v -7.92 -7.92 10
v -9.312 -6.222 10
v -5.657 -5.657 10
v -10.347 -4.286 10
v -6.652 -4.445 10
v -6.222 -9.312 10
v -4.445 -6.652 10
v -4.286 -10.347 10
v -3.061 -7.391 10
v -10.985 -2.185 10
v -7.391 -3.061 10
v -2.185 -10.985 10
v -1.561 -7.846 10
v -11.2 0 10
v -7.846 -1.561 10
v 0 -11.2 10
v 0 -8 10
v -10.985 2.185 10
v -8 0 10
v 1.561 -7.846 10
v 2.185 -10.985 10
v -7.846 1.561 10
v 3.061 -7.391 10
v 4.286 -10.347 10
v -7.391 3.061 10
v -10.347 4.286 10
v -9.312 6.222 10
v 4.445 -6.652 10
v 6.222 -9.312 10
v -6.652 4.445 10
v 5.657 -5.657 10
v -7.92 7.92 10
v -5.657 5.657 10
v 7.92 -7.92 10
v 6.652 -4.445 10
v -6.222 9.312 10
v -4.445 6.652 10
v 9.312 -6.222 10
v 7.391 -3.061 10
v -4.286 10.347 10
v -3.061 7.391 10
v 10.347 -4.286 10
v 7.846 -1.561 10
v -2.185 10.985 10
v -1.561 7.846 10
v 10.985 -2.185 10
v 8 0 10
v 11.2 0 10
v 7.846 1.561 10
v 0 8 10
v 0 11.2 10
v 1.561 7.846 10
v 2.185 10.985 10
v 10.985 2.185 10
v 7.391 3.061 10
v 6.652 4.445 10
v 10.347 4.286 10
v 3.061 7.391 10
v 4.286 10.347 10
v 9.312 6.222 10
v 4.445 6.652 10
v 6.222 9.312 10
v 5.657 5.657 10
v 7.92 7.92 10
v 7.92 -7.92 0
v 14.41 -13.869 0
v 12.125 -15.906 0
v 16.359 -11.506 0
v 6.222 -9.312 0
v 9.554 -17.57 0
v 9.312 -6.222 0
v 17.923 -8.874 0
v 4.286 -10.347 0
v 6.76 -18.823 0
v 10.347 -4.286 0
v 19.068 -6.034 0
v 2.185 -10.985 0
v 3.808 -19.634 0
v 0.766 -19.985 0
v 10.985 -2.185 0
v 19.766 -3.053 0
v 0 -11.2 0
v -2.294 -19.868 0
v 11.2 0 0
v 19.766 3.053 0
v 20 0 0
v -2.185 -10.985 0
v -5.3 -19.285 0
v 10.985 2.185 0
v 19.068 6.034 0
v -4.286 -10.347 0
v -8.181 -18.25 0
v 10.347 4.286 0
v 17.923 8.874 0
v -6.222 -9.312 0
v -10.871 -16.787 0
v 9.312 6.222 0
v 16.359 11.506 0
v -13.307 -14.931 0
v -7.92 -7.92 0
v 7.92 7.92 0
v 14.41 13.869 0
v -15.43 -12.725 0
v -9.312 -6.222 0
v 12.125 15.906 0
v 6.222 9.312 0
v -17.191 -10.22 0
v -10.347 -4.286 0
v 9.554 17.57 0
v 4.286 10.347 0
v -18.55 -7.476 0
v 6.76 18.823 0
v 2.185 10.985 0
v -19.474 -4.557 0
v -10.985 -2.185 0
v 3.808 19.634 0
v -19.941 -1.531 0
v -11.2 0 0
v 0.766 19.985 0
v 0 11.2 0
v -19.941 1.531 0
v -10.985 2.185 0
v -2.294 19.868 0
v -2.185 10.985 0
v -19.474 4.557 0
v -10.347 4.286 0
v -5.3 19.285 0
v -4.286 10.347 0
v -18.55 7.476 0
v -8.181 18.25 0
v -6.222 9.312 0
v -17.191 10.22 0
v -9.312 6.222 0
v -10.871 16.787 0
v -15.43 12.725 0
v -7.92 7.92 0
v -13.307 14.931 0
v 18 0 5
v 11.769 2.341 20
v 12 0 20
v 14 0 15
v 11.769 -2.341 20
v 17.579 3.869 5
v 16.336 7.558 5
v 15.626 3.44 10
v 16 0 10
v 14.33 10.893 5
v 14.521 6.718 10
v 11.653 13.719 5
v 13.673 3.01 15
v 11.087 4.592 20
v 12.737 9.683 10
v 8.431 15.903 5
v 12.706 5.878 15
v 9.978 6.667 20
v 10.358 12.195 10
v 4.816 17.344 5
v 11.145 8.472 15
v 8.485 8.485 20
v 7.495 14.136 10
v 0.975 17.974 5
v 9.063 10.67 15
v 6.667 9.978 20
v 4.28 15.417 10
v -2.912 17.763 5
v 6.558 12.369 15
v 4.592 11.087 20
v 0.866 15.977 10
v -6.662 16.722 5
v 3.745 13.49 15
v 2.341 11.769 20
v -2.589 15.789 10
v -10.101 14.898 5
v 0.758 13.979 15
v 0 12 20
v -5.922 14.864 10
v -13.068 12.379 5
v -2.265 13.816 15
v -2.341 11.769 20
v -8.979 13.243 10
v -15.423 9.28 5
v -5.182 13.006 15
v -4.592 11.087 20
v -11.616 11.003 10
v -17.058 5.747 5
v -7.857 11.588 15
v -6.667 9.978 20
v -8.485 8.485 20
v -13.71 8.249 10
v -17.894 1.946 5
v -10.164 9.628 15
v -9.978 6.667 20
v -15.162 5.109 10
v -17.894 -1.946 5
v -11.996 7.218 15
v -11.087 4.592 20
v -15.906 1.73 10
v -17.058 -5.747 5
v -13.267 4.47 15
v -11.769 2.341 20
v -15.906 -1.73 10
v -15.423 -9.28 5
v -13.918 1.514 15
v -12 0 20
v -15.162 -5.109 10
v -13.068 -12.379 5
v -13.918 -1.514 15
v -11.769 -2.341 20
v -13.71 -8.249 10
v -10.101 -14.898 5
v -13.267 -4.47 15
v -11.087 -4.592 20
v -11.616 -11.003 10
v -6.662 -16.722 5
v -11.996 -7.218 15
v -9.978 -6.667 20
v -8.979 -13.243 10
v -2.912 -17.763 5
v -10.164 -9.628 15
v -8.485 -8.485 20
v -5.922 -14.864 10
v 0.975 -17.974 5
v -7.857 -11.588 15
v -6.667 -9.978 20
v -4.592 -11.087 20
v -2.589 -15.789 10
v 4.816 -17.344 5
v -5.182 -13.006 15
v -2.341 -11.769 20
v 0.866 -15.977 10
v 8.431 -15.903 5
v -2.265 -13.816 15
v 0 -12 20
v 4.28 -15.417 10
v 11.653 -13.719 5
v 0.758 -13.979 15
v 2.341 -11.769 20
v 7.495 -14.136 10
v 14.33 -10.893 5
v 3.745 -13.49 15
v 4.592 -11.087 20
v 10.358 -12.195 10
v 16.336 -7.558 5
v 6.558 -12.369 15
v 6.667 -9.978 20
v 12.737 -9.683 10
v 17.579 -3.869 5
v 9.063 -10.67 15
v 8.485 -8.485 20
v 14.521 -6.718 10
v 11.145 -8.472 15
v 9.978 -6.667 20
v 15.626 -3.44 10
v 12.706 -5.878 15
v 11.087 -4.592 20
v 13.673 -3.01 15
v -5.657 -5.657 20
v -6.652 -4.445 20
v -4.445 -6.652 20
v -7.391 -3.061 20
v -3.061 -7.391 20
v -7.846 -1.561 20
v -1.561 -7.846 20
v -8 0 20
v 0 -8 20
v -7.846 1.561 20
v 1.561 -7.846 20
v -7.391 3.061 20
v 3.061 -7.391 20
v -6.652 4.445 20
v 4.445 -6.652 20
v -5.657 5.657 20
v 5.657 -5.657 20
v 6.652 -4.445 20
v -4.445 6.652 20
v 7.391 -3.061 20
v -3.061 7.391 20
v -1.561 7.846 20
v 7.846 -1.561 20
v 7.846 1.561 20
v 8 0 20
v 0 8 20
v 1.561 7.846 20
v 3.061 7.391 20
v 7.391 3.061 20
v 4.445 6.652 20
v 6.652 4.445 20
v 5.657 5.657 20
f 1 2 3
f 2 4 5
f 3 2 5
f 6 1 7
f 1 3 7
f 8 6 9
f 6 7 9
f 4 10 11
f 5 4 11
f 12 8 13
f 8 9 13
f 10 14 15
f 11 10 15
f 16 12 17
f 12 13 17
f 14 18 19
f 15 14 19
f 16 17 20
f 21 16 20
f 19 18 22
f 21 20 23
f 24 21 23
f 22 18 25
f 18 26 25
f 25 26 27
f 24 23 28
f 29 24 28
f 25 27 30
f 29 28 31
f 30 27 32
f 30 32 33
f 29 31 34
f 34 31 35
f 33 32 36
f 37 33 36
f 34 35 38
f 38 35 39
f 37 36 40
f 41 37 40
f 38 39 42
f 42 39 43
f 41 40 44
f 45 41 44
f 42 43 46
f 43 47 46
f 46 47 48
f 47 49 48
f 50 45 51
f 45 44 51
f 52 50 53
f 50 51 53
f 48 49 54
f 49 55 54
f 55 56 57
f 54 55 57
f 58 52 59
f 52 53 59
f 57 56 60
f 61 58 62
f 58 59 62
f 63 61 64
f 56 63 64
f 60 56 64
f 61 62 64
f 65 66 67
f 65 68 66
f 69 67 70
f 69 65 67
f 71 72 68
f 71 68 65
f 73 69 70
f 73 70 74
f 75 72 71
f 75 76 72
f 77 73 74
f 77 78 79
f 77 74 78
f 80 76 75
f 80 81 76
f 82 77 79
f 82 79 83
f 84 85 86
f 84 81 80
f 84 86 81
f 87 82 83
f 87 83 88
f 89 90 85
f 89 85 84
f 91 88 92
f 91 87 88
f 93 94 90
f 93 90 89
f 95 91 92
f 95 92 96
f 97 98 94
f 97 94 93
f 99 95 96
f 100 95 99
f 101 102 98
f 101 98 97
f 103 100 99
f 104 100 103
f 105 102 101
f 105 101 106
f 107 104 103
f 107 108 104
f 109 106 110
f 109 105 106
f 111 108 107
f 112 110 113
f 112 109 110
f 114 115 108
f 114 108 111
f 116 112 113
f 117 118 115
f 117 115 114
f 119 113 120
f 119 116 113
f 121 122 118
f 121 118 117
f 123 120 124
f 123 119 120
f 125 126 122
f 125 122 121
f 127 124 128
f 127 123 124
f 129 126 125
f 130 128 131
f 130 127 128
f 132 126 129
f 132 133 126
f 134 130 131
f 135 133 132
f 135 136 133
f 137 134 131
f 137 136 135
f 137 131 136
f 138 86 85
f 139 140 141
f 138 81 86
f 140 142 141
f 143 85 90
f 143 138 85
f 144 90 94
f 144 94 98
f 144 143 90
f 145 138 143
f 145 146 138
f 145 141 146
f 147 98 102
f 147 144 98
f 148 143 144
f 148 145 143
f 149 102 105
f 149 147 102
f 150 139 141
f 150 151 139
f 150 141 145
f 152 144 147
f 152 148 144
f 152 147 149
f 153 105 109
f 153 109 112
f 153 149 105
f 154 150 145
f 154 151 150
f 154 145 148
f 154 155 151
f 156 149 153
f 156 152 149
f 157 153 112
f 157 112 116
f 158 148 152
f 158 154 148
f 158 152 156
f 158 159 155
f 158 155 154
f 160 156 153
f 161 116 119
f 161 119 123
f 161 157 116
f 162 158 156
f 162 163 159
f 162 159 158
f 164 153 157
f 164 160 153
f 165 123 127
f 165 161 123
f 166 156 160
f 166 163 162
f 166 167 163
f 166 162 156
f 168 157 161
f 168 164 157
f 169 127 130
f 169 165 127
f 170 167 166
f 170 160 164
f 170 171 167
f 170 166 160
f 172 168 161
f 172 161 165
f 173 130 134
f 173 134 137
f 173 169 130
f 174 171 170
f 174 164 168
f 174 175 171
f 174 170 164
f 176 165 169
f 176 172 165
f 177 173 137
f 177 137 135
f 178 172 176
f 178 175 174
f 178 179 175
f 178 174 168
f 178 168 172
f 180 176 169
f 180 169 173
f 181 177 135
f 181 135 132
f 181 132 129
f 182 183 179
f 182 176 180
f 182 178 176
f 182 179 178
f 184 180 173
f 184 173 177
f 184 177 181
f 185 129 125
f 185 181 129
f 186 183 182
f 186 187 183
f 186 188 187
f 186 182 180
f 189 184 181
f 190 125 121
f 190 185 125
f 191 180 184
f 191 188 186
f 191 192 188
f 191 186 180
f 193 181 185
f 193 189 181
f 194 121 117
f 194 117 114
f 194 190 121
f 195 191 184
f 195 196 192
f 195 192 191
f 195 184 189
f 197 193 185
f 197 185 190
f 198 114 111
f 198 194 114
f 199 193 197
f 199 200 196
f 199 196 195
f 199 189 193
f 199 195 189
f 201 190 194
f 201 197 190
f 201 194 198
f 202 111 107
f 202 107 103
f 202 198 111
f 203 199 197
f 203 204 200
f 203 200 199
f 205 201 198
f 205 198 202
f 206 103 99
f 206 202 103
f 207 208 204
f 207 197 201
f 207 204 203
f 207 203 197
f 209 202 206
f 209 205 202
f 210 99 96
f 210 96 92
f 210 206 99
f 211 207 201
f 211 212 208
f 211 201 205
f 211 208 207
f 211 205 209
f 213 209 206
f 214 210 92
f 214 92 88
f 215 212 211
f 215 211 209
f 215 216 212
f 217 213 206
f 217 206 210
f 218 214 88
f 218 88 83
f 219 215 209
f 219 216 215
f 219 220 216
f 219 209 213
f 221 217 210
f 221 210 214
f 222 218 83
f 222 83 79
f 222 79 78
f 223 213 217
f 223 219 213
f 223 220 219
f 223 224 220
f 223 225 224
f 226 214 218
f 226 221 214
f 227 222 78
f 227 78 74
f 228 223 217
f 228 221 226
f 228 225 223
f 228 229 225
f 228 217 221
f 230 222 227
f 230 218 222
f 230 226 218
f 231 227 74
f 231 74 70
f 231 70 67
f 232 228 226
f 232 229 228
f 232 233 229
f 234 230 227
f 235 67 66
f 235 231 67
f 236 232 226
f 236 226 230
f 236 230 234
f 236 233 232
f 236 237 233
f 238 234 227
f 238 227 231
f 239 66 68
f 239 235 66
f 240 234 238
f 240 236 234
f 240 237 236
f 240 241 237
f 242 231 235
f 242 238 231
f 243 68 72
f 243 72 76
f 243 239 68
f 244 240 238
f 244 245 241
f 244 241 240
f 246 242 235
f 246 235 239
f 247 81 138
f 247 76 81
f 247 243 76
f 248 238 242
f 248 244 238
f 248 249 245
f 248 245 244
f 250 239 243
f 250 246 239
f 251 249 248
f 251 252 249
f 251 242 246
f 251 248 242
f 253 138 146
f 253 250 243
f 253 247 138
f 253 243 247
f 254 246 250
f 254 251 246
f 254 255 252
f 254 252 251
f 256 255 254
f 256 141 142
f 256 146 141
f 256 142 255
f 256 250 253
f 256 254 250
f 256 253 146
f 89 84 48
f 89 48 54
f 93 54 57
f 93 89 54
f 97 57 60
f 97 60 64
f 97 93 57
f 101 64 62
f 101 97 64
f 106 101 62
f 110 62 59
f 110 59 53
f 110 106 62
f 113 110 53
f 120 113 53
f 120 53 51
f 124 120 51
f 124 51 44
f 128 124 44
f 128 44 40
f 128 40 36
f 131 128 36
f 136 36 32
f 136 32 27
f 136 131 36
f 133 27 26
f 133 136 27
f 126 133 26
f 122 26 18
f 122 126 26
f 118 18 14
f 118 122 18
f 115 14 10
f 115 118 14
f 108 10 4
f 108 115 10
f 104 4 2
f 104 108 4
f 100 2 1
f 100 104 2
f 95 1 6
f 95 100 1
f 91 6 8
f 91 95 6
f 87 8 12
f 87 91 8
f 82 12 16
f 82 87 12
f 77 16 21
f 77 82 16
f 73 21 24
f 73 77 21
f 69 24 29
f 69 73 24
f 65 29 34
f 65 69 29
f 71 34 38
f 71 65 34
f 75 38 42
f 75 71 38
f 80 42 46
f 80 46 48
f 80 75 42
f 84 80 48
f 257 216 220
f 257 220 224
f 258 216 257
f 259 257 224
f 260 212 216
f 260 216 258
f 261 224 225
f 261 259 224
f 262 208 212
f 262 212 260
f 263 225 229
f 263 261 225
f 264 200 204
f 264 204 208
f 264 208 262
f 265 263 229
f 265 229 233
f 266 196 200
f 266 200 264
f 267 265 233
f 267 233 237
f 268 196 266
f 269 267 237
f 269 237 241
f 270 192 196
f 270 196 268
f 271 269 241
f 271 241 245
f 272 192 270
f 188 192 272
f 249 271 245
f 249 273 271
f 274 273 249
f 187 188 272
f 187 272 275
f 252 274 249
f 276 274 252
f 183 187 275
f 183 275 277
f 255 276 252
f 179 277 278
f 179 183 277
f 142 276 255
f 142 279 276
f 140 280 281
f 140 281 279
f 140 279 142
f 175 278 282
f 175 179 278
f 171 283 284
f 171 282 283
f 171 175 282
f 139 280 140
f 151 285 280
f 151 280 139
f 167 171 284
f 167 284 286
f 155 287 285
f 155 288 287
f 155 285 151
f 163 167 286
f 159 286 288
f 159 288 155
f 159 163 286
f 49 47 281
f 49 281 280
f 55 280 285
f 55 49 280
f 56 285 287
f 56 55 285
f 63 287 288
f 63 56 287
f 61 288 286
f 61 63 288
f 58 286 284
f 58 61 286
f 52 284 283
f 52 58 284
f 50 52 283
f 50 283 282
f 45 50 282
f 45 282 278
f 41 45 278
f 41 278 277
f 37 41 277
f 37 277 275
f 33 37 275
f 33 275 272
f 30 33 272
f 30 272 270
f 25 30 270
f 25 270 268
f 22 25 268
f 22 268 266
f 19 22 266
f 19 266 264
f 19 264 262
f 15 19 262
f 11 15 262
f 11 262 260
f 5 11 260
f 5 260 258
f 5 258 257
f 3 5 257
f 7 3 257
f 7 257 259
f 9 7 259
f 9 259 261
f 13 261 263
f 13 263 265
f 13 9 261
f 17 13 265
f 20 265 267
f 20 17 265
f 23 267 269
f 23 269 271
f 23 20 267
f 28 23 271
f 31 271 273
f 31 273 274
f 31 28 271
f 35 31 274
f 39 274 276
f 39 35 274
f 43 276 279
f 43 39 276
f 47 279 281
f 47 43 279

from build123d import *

# Parameters (mm, degrees)
CYLINDER001_R     = 8
CYLINDER001_DEPTH = 20
CYLINDER_R        = 11.2
CYLINDER_DEPTH    = 10


with BuildPart() as cylinder001:
    # Cylinder001 → Cylinder001 (new body)
    with BuildSketch(Plane.XY):
        Circle(CYLINDER001_R)
    extrude(amount=CYLINDER001_DEPTH)


with BuildPart() as cylinder:
    # Cylinder → Cylinder (new body)
    with BuildSketch(Plane.XY):
        Circle(CYLINDER_R)
    extrude(amount=CYLINDER_DEPTH)


with BuildPart() as cut001:
    # Cone → Cone (revolve)
    with BuildSketch(Plane.XZ):
        Polygon((0, 0), (20, 0), (12, 20), (0, 20), align=None)
    revolve(axis=Axis((0, 0, 0), (0, 0, 1)))

    # Cut: cut Cylinder
    add(cylinder.part, mode=Mode.SUBTRACT)

    # Cut001: cut Cylinder001
    add(cylinder001.part, mode=Mode.SUBTRACT)


solid = cut001.part
